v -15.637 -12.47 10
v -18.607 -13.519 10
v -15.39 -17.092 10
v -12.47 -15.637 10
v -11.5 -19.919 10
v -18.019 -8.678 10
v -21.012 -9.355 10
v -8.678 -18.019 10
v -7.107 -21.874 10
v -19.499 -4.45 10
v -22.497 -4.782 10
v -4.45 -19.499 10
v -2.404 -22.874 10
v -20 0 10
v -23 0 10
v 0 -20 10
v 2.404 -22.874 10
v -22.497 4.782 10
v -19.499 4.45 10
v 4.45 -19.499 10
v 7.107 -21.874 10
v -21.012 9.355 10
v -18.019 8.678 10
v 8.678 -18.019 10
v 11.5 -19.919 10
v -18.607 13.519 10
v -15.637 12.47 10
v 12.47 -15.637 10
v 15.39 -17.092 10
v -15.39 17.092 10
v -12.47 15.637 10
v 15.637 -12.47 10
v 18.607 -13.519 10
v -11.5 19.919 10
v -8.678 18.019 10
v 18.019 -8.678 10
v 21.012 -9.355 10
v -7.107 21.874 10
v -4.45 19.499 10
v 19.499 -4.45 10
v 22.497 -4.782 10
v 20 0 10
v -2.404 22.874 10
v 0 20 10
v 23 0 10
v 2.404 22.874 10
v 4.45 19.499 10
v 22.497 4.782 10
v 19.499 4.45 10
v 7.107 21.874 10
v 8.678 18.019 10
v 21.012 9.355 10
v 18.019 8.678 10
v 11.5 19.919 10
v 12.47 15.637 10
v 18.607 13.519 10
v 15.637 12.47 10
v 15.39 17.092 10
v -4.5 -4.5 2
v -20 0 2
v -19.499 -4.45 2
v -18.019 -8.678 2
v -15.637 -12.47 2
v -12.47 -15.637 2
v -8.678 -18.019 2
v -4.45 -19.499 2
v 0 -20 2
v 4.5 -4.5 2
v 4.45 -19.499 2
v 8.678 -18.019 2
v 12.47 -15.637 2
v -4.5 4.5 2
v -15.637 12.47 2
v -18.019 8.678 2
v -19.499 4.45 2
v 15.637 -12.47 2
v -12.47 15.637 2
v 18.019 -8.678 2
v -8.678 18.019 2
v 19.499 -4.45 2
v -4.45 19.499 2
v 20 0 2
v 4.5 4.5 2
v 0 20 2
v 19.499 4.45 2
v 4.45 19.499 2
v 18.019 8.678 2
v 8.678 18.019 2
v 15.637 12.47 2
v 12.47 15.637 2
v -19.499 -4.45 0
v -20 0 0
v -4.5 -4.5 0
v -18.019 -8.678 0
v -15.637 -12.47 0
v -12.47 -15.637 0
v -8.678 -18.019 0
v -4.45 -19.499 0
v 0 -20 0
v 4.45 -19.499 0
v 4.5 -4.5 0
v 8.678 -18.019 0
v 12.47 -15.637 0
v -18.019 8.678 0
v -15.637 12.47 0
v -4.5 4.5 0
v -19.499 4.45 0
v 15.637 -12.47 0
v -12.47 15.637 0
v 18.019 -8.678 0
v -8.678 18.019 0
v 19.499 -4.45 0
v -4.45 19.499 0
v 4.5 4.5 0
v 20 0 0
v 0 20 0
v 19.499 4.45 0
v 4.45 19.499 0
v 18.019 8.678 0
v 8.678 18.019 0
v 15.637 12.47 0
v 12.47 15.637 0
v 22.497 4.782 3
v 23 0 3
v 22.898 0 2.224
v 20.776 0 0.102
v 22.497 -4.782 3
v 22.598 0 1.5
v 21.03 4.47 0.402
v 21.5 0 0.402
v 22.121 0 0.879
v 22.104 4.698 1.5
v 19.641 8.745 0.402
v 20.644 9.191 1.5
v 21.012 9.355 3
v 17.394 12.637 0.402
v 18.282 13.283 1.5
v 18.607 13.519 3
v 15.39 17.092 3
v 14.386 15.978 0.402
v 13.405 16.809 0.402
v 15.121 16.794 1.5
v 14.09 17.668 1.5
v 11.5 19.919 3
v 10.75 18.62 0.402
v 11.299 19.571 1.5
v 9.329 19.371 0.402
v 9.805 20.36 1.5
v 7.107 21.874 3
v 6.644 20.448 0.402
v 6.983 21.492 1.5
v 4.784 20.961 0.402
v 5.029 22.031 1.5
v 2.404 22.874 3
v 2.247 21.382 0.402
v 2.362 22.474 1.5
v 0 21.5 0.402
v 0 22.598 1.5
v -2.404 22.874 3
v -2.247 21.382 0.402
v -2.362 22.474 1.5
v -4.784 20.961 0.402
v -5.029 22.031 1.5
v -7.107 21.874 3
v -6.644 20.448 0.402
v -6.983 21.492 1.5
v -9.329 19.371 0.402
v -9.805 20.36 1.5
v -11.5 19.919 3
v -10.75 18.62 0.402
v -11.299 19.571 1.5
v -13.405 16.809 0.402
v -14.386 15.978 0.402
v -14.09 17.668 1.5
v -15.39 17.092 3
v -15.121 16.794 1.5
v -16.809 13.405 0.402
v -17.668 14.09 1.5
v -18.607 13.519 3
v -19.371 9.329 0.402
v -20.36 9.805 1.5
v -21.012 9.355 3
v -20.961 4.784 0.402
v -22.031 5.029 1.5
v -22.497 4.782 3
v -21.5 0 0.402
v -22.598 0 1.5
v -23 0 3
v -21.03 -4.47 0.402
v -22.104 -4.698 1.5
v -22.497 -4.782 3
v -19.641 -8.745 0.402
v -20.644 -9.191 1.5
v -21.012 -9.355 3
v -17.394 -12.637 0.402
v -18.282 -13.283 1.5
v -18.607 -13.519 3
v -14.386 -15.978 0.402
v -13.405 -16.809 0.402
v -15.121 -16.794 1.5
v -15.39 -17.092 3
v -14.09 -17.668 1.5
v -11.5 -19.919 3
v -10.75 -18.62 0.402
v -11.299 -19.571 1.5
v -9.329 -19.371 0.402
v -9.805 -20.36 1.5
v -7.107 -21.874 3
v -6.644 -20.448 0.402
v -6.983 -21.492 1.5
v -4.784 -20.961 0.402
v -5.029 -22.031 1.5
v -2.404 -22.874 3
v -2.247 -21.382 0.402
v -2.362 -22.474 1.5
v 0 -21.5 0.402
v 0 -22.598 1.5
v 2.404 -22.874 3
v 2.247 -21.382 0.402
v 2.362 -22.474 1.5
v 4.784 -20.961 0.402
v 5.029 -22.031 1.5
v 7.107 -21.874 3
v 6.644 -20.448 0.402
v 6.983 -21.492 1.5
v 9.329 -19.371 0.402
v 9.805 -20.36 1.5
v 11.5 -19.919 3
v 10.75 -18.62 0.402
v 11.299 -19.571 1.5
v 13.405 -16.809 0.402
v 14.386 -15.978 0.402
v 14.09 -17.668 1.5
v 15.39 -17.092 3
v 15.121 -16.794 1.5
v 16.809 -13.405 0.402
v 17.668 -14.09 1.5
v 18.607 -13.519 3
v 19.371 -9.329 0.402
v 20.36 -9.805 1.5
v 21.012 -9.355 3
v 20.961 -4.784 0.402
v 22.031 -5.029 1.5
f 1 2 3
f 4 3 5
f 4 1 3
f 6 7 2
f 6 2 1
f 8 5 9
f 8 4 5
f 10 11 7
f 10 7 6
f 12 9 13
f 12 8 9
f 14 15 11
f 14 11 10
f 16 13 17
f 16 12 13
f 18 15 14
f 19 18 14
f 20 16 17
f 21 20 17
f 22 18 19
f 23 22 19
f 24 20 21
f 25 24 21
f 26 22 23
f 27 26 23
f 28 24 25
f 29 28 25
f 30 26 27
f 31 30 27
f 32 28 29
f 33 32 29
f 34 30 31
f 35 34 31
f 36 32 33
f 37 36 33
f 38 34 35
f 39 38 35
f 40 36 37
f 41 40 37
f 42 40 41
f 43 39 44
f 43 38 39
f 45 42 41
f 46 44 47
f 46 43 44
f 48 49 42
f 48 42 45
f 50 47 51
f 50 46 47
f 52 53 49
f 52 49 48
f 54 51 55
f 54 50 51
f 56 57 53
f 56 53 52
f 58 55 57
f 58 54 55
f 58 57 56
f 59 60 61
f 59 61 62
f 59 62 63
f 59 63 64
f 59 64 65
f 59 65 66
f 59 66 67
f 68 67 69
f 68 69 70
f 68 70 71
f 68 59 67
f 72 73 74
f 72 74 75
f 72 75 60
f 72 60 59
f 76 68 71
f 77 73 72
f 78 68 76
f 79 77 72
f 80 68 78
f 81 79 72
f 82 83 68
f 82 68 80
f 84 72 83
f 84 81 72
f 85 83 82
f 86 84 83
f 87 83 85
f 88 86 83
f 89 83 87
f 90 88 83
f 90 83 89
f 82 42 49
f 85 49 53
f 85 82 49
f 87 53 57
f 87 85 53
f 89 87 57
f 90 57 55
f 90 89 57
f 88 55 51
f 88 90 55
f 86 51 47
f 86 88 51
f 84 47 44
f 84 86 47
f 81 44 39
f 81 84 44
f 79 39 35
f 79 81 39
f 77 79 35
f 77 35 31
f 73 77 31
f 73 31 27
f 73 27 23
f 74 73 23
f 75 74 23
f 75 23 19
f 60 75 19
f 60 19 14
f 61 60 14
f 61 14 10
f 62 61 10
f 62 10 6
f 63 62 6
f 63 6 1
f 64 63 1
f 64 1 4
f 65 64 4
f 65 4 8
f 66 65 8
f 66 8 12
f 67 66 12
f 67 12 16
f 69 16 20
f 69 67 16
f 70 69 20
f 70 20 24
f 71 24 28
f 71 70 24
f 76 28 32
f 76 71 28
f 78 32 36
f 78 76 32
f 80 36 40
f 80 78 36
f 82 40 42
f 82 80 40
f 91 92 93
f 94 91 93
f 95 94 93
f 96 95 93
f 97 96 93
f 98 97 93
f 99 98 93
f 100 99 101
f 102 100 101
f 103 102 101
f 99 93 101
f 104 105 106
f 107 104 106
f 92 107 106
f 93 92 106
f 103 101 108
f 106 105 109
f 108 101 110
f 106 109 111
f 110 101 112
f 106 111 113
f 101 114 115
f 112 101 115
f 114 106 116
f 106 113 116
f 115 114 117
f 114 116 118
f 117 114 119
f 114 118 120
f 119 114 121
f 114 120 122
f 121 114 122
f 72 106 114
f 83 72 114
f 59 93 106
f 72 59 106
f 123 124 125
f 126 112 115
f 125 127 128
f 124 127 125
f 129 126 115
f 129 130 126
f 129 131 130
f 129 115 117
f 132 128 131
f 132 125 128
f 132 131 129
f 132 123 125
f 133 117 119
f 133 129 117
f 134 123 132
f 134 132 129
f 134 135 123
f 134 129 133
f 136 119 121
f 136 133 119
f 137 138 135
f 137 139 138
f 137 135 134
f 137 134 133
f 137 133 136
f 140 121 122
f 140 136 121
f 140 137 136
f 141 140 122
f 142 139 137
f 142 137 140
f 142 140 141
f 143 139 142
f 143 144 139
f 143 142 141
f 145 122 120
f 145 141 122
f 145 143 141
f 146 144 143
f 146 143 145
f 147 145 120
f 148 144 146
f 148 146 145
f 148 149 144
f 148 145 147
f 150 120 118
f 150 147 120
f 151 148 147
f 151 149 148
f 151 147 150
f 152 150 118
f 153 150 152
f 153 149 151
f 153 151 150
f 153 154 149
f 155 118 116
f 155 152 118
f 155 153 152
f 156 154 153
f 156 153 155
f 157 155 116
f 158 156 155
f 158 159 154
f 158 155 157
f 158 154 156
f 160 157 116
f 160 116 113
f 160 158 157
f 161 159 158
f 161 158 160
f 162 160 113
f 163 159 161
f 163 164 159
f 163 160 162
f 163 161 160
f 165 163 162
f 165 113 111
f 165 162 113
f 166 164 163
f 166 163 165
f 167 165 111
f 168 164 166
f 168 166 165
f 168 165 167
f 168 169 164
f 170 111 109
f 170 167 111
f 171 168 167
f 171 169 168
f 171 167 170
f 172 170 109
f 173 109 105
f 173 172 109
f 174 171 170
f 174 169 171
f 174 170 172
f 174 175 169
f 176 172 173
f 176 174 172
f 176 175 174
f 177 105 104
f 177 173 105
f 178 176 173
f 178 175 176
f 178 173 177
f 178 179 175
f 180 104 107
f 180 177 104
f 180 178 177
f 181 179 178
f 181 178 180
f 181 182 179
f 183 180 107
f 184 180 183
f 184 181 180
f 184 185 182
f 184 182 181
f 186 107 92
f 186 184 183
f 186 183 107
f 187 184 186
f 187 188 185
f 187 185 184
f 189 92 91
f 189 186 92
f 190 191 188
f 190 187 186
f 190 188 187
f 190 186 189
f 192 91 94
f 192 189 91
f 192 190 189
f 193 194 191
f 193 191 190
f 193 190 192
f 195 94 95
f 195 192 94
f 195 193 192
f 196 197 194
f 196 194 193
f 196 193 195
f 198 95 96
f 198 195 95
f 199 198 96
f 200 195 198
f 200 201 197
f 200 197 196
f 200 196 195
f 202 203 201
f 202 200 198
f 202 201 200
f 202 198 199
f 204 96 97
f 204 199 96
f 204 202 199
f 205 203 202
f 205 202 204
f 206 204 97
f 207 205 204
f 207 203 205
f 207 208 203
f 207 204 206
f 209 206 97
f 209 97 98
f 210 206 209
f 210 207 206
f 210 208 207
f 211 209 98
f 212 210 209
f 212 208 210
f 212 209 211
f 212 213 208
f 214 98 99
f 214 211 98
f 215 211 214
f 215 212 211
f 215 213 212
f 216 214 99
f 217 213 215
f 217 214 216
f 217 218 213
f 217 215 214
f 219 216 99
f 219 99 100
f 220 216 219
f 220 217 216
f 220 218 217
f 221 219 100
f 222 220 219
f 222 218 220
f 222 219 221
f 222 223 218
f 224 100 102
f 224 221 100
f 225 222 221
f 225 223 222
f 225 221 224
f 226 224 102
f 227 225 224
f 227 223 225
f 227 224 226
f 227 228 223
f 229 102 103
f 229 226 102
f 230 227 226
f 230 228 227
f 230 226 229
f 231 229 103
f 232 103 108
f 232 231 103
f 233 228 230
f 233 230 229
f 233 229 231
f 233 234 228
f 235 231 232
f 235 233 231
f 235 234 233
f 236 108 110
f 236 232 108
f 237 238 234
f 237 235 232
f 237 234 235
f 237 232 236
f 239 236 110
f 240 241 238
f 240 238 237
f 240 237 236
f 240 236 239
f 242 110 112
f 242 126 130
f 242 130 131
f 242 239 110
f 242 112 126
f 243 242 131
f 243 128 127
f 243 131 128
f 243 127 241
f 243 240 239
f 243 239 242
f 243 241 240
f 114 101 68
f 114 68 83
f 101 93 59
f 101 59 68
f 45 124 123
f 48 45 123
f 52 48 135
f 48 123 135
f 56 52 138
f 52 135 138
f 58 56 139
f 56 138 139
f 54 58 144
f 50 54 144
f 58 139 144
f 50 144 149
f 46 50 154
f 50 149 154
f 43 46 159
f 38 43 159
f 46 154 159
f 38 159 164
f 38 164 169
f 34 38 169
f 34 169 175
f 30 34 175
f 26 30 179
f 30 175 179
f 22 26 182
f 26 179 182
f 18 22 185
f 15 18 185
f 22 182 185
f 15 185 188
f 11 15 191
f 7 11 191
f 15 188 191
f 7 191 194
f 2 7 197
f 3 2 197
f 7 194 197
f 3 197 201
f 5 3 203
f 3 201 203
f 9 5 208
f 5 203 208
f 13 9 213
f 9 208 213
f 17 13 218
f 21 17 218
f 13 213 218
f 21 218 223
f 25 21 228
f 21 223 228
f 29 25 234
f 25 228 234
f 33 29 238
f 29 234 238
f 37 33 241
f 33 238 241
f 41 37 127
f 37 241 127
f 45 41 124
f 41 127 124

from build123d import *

# Parameters (mm, degrees)
F0_R     = 23
F0_R_2   = 20
F1_DEPTH = 10
F2_R     = 20
F2_W     = 9
F2_H     = 9
F3_DEPTH = 2
F4_R     = 3


with BuildPart() as f1:
    # F0 (on Top) → F1 (new body)
    with BuildSketch(Plane.XY):
        Circle(F0_R)
        Circle(F0_R_2, mode=Mode.SUBTRACT)
    extrude(amount=F1_DEPTH)

    # F2 (on Top) → F3 (join)
    with BuildSketch(Plane.XY):
        Circle(F2_R)
        Rectangle(F2_W, F2_H, mode=Mode.SUBTRACT)
    extrude(amount=F3_DEPTH)

    # F4
    f4_edges = [f1.edges().sort_by_distance(p)[0] for p in [
        (-23, 0, 0),
    ]]
    fillet(f4_edges, radius=F4_R)


solid = f1.part
